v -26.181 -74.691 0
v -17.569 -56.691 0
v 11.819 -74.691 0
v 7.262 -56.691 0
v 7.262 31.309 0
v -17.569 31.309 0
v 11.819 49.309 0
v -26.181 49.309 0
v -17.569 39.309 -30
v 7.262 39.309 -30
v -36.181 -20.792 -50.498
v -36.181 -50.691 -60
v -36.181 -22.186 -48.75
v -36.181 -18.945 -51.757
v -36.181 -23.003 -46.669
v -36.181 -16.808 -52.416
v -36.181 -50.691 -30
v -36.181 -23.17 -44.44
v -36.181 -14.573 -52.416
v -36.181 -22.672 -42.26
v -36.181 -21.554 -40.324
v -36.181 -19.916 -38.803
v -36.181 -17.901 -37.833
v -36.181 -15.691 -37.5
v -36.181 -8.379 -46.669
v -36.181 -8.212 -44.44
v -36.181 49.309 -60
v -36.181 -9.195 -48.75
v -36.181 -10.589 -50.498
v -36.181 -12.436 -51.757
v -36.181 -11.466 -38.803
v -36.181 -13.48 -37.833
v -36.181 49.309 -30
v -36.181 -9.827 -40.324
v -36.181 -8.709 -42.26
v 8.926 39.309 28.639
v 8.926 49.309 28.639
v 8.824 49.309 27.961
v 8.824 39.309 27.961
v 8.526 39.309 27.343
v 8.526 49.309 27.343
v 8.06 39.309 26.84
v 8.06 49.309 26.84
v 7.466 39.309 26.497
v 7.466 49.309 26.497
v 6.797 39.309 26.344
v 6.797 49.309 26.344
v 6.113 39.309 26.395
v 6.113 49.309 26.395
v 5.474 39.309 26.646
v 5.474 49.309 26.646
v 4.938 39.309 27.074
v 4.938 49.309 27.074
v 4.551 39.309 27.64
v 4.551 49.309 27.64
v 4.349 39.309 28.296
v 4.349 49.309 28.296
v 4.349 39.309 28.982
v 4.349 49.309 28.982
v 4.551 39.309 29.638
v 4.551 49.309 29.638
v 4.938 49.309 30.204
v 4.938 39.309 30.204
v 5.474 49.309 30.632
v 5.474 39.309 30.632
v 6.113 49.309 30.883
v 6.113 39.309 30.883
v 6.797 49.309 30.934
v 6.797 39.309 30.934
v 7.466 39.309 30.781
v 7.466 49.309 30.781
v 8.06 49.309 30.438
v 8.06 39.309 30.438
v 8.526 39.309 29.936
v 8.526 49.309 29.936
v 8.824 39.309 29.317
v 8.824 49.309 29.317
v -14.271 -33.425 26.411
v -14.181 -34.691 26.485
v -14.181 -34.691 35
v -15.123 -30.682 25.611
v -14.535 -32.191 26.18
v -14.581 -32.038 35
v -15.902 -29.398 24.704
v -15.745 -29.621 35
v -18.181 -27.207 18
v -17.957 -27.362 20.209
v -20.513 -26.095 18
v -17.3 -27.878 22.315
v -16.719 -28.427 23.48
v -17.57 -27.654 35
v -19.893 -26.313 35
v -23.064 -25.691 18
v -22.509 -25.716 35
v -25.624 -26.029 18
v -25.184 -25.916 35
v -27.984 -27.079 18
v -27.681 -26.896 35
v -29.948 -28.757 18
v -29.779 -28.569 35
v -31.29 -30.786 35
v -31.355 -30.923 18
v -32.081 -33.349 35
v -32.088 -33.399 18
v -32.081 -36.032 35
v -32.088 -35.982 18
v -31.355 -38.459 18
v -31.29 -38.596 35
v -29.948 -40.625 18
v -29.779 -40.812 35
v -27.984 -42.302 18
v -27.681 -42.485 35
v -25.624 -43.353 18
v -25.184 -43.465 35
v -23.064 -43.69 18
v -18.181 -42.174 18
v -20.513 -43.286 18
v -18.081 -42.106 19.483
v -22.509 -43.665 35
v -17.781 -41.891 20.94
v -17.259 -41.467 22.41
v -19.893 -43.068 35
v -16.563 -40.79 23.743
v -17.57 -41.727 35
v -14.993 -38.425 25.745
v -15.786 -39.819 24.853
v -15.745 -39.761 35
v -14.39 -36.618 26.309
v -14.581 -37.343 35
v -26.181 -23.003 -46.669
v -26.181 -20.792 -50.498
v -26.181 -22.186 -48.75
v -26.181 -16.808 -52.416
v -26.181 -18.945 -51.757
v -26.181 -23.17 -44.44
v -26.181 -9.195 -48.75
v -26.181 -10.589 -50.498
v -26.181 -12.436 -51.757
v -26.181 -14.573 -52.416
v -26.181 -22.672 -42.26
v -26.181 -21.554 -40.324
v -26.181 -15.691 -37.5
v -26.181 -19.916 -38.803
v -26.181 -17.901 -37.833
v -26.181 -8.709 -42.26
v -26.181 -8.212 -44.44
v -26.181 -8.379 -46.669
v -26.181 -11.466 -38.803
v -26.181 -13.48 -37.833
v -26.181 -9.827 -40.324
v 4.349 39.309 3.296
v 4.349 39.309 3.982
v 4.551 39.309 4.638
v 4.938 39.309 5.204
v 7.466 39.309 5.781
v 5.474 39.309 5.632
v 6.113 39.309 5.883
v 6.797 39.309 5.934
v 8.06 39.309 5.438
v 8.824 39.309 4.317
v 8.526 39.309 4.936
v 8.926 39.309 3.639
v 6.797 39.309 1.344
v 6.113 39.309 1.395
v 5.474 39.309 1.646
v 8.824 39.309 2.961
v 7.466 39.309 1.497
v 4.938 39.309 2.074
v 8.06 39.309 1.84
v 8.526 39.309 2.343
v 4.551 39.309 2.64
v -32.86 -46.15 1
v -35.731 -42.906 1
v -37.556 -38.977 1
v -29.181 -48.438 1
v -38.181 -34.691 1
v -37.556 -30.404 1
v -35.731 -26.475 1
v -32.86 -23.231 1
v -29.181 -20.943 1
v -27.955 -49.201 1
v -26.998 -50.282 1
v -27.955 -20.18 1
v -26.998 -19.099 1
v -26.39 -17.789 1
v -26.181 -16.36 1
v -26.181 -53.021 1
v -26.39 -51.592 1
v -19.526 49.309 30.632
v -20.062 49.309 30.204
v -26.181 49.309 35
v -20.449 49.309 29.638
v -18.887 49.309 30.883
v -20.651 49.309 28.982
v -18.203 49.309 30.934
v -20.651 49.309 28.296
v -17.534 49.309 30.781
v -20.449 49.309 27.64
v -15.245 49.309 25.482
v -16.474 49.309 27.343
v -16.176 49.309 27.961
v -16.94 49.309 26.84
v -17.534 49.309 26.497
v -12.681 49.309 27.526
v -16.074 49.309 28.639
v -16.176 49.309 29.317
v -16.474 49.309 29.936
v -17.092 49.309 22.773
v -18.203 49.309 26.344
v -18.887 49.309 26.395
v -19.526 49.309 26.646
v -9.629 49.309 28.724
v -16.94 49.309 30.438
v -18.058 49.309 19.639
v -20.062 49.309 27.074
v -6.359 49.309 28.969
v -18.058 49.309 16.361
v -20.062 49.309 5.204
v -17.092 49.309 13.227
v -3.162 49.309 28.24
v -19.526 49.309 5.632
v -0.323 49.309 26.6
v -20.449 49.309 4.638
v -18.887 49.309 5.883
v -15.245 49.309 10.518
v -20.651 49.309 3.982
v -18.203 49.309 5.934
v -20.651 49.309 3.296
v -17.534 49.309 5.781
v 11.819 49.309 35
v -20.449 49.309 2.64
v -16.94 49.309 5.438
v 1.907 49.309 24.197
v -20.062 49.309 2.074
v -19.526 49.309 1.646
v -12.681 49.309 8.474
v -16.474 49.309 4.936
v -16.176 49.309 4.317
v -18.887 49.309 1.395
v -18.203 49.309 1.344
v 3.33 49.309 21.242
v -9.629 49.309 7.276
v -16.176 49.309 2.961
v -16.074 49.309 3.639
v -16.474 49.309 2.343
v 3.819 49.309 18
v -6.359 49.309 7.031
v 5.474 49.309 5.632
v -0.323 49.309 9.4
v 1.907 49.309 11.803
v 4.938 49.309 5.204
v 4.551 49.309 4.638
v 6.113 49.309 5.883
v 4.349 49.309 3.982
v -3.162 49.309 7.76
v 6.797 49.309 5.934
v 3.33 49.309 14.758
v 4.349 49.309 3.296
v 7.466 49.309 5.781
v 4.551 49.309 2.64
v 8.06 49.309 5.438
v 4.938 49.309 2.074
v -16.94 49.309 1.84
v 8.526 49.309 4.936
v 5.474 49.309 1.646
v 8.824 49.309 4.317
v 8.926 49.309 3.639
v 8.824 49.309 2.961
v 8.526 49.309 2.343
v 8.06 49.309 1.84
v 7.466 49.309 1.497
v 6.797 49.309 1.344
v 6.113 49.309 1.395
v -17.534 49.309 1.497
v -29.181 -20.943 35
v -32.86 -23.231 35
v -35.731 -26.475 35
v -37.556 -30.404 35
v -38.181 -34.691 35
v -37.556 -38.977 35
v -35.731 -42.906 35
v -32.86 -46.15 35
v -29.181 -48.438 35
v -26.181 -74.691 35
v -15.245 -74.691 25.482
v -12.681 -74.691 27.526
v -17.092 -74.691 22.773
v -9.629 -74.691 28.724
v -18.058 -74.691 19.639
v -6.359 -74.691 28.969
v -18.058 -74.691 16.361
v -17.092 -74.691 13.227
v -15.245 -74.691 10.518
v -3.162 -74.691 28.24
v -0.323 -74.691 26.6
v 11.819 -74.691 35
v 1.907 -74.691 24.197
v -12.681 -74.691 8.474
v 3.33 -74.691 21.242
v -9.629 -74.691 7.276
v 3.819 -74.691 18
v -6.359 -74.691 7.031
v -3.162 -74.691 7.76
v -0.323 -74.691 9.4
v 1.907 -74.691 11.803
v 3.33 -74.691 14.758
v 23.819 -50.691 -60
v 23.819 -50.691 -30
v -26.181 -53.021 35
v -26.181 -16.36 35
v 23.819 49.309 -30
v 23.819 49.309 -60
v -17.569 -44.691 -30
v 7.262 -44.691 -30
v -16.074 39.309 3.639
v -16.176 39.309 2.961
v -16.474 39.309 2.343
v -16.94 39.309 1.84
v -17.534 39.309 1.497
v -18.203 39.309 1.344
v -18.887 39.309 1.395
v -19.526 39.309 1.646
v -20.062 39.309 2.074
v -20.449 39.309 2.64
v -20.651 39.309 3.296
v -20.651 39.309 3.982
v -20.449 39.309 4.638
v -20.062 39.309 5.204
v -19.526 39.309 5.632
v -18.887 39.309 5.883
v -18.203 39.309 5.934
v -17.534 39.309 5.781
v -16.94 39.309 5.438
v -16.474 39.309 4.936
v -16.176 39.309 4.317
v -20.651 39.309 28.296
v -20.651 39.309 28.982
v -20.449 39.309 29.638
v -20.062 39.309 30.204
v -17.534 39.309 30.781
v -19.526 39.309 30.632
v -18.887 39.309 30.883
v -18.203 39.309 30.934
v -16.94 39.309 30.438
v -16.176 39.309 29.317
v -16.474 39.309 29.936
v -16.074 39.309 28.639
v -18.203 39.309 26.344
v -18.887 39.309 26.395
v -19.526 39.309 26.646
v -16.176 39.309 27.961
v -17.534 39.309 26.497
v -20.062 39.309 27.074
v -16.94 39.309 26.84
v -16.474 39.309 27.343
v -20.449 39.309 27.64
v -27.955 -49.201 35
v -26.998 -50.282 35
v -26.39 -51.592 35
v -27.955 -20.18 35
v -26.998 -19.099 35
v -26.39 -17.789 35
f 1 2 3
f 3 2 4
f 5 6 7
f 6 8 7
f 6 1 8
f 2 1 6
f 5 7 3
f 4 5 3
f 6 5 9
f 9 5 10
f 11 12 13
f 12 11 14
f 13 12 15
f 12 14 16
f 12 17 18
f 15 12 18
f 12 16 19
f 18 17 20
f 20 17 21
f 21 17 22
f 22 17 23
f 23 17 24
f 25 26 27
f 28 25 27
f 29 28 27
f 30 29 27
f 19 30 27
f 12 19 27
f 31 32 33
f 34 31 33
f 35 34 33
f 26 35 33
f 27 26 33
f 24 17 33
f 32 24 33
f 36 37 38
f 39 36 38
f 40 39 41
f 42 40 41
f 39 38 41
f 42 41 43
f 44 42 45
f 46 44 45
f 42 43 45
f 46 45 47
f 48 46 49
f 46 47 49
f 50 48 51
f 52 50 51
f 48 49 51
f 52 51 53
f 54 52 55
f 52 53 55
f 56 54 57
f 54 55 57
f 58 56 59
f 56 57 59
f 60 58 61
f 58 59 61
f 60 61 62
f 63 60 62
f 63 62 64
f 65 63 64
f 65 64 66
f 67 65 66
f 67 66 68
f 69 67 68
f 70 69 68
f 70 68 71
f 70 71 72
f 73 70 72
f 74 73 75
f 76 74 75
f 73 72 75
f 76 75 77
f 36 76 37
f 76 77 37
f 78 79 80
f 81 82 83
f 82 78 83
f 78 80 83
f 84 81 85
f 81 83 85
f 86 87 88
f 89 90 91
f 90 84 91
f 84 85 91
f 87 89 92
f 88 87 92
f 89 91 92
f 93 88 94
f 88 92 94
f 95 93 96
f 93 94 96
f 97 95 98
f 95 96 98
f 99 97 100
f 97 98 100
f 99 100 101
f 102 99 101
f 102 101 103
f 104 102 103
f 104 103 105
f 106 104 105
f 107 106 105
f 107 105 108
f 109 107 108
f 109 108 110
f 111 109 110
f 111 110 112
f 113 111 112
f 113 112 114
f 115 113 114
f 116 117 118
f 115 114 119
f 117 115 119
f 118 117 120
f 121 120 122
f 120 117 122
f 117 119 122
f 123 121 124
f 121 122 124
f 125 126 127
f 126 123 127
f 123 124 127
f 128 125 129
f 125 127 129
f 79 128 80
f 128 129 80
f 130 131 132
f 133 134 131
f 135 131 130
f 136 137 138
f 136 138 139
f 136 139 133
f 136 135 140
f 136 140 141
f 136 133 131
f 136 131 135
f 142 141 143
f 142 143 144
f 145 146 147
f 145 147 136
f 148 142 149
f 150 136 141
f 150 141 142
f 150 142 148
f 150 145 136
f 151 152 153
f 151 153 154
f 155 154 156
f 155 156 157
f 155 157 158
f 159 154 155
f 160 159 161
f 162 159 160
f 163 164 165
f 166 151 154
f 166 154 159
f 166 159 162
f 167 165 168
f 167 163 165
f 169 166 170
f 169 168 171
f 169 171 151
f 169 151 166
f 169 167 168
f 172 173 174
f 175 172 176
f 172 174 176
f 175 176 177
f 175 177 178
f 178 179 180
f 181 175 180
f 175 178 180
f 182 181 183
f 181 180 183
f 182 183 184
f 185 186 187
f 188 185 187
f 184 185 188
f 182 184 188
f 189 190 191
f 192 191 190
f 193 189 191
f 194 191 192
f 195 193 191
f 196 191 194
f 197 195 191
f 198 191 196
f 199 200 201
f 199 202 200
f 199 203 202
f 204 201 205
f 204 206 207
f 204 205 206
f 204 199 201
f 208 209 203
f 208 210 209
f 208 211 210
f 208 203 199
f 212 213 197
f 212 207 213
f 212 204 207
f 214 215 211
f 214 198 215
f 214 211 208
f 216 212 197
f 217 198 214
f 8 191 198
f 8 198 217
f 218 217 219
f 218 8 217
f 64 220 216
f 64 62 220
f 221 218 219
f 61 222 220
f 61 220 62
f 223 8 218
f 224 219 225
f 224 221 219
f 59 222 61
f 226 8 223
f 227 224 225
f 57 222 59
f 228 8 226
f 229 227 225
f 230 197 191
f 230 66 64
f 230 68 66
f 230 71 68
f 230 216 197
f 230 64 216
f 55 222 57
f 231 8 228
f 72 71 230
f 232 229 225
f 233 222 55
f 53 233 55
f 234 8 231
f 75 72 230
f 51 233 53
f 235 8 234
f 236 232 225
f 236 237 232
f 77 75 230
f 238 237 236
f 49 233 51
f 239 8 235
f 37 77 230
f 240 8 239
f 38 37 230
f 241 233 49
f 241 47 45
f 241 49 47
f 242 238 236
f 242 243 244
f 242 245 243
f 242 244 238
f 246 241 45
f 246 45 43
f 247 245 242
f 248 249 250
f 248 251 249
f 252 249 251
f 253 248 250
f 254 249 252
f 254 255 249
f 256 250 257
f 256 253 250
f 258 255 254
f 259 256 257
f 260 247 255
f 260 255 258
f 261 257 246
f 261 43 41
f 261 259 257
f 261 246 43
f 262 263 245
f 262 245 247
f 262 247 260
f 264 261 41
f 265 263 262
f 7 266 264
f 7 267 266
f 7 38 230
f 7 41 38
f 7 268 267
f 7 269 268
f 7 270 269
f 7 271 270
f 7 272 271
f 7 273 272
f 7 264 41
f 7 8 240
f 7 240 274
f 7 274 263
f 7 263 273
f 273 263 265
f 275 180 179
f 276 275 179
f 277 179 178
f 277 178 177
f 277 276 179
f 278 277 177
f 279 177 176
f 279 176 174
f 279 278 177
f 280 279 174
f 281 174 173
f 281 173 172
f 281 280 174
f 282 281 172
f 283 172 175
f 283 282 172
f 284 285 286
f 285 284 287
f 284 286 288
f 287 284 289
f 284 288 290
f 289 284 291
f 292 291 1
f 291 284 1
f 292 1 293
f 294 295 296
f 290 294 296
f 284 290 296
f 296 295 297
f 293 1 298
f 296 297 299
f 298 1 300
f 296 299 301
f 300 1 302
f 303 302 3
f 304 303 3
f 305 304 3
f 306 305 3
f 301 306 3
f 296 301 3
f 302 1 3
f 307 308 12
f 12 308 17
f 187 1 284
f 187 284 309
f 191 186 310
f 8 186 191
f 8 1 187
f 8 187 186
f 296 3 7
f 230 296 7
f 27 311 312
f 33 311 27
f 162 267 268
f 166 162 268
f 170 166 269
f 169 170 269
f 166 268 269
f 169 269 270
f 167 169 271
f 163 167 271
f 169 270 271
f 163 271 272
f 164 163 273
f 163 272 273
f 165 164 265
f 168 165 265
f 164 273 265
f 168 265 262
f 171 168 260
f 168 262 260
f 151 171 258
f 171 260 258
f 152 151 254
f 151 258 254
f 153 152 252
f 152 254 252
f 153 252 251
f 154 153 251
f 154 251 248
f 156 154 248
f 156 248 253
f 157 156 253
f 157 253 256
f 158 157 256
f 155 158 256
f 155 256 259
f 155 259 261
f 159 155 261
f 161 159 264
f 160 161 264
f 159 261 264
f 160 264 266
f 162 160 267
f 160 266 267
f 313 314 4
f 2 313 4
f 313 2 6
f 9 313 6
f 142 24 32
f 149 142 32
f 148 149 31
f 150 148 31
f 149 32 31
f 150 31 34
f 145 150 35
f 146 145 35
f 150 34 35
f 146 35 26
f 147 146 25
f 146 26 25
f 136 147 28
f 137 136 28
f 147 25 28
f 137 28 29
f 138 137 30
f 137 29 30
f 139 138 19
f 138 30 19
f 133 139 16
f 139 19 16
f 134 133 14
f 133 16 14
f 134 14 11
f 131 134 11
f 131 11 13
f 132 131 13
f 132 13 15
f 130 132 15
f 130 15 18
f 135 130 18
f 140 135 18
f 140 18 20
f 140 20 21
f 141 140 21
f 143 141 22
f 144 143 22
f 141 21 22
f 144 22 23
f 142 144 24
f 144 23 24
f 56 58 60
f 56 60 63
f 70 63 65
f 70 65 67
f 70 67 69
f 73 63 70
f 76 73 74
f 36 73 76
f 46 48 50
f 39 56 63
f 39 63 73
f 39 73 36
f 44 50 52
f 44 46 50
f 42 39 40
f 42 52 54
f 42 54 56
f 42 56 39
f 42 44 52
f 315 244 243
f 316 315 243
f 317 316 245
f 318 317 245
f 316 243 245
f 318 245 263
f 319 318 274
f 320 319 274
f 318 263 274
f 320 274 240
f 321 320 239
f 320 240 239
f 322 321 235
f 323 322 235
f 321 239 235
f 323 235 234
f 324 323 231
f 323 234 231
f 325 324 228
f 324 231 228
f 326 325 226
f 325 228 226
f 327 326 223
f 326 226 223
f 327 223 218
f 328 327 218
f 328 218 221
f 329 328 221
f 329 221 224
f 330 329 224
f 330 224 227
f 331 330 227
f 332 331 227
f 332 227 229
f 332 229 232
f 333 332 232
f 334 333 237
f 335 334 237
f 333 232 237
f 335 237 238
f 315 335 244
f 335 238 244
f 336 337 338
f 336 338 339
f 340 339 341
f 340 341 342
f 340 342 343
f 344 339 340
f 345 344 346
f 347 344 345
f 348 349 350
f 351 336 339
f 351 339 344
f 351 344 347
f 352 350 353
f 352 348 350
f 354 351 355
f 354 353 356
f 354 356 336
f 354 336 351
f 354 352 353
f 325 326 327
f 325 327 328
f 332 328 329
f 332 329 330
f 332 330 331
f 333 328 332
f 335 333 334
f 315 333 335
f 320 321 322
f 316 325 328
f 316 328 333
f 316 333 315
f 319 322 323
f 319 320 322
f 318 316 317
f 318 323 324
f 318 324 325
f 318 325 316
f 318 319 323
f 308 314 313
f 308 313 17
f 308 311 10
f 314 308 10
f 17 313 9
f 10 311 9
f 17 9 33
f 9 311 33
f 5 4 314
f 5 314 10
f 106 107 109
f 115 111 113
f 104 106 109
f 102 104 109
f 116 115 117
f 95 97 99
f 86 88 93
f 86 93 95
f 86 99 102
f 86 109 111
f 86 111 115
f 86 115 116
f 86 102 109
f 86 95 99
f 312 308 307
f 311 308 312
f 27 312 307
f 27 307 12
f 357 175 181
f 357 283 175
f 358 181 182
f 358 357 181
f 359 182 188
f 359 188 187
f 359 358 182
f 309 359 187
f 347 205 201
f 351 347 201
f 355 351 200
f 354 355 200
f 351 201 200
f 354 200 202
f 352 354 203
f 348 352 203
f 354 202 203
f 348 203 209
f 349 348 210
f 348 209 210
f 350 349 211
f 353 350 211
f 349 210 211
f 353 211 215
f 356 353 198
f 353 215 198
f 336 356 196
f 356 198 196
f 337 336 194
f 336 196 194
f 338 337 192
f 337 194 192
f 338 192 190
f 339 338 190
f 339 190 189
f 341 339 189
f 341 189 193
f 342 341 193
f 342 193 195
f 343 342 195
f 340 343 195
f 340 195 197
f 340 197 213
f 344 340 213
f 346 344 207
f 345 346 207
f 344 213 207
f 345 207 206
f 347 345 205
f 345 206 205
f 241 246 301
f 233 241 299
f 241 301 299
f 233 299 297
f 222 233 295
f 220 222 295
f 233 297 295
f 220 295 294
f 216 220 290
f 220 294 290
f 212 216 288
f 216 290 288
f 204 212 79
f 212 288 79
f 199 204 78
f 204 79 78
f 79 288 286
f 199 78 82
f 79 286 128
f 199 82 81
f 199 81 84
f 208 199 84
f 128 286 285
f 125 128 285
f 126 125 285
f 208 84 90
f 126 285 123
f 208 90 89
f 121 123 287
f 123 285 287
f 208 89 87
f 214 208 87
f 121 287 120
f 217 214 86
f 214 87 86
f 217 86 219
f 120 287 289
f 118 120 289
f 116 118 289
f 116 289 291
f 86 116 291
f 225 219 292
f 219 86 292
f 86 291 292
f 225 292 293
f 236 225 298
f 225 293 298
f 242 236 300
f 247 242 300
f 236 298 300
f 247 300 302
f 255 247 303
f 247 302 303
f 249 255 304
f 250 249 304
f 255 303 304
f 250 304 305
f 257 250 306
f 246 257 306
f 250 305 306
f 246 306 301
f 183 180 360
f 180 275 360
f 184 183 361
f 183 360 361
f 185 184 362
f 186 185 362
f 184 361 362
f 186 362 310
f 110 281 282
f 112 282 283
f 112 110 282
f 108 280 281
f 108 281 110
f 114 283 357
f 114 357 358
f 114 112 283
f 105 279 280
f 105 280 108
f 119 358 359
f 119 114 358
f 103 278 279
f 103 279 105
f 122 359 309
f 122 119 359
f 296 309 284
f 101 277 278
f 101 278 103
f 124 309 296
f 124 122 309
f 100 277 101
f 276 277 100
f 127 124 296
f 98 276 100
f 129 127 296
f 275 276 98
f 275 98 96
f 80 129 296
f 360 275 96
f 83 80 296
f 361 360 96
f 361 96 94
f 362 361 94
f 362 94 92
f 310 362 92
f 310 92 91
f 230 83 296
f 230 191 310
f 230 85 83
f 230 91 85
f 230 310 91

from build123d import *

# Parameters (mm, degrees)
SKETCH1_W            = 38
SKETCH1_H            = 124
BOSS_EXTRUDE1_DEPTH  = 35
SKETCH2_R            = 15
BOSS_EXTRUDE2_DEPTH  = 34
FILLET1_R            = 5
SKETCH3_R            = 11
CUT_EXTRUDE1_DEPTH   = 1000
SKETCH5_W            = 24.830906905
SKETCH5_H            = 111.203932215
BOSS_EXTRUDE3_DEPTH  = 30
SKETCH6_W            = 60
SKETCH6_H            = 100
BOSS_EXTRUDE4_DEPTH  = 30
CUT_EXTRUDE5_DEPTH   = 100
SKETCH10_R           = 7.5
CUT_EXTRUDE6_DEPTH   = 10
SKETCH11_R           = 2.301516645
CUT_EXTRUDE7_DEPTH   = 10
LPATTERN1_COUNT      = 2
LPATTERN1_PITCH      = 25
LPATTERN1_COUNT_DIR2 = 2
LPATTERN1_PITCH_DIR2 = 25
SKETCH4_R            = 9
CUT_EXTRUDE_1_DEPTH  = 17


with BuildPart() as part:
    # Sketch1 → Boss-Extrude1 (new body)
    with BuildSketch(Plane.XY):
        with Locations((-7.18125, -12.690625)):
            Rectangle(SKETCH1_W, SKETCH1_H)
    extrude(amount=BOSS_EXTRUDE1_DEPTH)

    # Sketch2 → Boss-Extrude2 (add)
    with BuildSketch(Plane.XY.offset(35)):
        with Locations((-23.18125, -34.690625)):
            Circle(SKETCH2_R)
    extrude(amount=-BOSS_EXTRUDE2_DEPTH)

    # Fillet1
    fillet1_edges = [part.edges().sort_by_distance(p)[0] for p in [
        (-26.18125, -19.993686543, 18),
        (-26.18125, -49.387563457, 18),
    ]]
    fillet(fillet1_edges, radius=FILLET1_R)

    # Sketch3 → Cut-Extrude1 (cut)
    with BuildSketch(Plane.XZ.offset(74.690625)):
        with Locations((-7.18125, 18)):
            Circle(SKETCH3_R)
    extrude(amount=-CUT_EXTRUDE1_DEPTH, mode=Mode.SUBTRACT)

    # Sketch5 → Boss-Extrude3 (add)
    with BuildSketch(Plane(origin=(0, 0, 0), x_dir=(-1, 0, 0), z_dir=(0, 0, -1))):
        with Locations((5.153648801, -6.911017359)):
            Rectangle(SKETCH5_W, SKETCH5_H)
    extrude(amount=BOSS_EXTRUDE3_DEPTH)

    # Sketch6 → Boss-Extrude4 (add)
    with BuildSketch(Plane(origin=(0, 0, -30), x_dir=(-1, 0, 0), z_dir=(0, 0, -1))):
        with Locations((6.18125, -0.690625)):
            Rectangle(SKETCH6_W, SKETCH6_H)
    extrude(amount=BOSS_EXTRUDE4_DEPTH)

    # Sketch9 → Cut-Extrude5 (cut)
    with BuildSketch(Plane(origin=(7.261804652, 0, 0), x_dir=(0, 0, -1), z_dir=(1, 0, 0))):
        Polygon((0, 52.602660234), (0, 31.309375), (30, 39.309375), (30, 52.602660234), align=None)
        Polygon((0, -56.690625), (0, -66.373805341), (30, -69.28142928), (30, -44.690625), align=None)
    extrude(amount=-CUT_EXTRUDE5_DEPTH, mode=Mode.SUBTRACT)

    # Sketch10 → Cut-Extrude6 (cut)
    with BuildSketch(Plane.ZY.offset(36.18125)):
        with Locations((-45, -15.690625)):
            Circle(SKETCH10_R)
    extrude(amount=-CUT_EXTRUDE6_DEPTH, mode=Mode.SUBTRACT)

    # Sketch11 → Cut-Extrude7 (cut)
    with BuildSketch(Plane(origin=(0, 49.309375, 0), x_dir=(1, 0, 0), z_dir=(0, 1, 0))):
        with Locations((6.624715973, -28.639015413)):
            Circle(SKETCH11_R)
    cut_extrude7 = extrude(amount=-CUT_EXTRUDE7_DEPTH, mode=Mode.SUBTRACT)

    # LPattern1: Cut-Extrude7 2 × 2
    with Locations(*[(-i * LPATTERN1_PITCH, 0, -j * LPATTERN1_PITCH_DIR2) for i in range(LPATTERN1_COUNT) for j in range(LPATTERN1_COUNT_DIR2) if (i, j) != (0, 0)]):
        add(cut_extrude7, mode=Mode.SUBTRACT)

    # Sketch4 → Вырез-Вытянуть1 (cut)
    with BuildSketch(Plane.XY.offset(35)):
        with Locations((-23.18125, -34.690625)):
            Circle(SKETCH4_R)
    extrude(amount=-CUT_EXTRUDE_1_DEPTH, mode=Mode.SUBTRACT)


solid = part.part
